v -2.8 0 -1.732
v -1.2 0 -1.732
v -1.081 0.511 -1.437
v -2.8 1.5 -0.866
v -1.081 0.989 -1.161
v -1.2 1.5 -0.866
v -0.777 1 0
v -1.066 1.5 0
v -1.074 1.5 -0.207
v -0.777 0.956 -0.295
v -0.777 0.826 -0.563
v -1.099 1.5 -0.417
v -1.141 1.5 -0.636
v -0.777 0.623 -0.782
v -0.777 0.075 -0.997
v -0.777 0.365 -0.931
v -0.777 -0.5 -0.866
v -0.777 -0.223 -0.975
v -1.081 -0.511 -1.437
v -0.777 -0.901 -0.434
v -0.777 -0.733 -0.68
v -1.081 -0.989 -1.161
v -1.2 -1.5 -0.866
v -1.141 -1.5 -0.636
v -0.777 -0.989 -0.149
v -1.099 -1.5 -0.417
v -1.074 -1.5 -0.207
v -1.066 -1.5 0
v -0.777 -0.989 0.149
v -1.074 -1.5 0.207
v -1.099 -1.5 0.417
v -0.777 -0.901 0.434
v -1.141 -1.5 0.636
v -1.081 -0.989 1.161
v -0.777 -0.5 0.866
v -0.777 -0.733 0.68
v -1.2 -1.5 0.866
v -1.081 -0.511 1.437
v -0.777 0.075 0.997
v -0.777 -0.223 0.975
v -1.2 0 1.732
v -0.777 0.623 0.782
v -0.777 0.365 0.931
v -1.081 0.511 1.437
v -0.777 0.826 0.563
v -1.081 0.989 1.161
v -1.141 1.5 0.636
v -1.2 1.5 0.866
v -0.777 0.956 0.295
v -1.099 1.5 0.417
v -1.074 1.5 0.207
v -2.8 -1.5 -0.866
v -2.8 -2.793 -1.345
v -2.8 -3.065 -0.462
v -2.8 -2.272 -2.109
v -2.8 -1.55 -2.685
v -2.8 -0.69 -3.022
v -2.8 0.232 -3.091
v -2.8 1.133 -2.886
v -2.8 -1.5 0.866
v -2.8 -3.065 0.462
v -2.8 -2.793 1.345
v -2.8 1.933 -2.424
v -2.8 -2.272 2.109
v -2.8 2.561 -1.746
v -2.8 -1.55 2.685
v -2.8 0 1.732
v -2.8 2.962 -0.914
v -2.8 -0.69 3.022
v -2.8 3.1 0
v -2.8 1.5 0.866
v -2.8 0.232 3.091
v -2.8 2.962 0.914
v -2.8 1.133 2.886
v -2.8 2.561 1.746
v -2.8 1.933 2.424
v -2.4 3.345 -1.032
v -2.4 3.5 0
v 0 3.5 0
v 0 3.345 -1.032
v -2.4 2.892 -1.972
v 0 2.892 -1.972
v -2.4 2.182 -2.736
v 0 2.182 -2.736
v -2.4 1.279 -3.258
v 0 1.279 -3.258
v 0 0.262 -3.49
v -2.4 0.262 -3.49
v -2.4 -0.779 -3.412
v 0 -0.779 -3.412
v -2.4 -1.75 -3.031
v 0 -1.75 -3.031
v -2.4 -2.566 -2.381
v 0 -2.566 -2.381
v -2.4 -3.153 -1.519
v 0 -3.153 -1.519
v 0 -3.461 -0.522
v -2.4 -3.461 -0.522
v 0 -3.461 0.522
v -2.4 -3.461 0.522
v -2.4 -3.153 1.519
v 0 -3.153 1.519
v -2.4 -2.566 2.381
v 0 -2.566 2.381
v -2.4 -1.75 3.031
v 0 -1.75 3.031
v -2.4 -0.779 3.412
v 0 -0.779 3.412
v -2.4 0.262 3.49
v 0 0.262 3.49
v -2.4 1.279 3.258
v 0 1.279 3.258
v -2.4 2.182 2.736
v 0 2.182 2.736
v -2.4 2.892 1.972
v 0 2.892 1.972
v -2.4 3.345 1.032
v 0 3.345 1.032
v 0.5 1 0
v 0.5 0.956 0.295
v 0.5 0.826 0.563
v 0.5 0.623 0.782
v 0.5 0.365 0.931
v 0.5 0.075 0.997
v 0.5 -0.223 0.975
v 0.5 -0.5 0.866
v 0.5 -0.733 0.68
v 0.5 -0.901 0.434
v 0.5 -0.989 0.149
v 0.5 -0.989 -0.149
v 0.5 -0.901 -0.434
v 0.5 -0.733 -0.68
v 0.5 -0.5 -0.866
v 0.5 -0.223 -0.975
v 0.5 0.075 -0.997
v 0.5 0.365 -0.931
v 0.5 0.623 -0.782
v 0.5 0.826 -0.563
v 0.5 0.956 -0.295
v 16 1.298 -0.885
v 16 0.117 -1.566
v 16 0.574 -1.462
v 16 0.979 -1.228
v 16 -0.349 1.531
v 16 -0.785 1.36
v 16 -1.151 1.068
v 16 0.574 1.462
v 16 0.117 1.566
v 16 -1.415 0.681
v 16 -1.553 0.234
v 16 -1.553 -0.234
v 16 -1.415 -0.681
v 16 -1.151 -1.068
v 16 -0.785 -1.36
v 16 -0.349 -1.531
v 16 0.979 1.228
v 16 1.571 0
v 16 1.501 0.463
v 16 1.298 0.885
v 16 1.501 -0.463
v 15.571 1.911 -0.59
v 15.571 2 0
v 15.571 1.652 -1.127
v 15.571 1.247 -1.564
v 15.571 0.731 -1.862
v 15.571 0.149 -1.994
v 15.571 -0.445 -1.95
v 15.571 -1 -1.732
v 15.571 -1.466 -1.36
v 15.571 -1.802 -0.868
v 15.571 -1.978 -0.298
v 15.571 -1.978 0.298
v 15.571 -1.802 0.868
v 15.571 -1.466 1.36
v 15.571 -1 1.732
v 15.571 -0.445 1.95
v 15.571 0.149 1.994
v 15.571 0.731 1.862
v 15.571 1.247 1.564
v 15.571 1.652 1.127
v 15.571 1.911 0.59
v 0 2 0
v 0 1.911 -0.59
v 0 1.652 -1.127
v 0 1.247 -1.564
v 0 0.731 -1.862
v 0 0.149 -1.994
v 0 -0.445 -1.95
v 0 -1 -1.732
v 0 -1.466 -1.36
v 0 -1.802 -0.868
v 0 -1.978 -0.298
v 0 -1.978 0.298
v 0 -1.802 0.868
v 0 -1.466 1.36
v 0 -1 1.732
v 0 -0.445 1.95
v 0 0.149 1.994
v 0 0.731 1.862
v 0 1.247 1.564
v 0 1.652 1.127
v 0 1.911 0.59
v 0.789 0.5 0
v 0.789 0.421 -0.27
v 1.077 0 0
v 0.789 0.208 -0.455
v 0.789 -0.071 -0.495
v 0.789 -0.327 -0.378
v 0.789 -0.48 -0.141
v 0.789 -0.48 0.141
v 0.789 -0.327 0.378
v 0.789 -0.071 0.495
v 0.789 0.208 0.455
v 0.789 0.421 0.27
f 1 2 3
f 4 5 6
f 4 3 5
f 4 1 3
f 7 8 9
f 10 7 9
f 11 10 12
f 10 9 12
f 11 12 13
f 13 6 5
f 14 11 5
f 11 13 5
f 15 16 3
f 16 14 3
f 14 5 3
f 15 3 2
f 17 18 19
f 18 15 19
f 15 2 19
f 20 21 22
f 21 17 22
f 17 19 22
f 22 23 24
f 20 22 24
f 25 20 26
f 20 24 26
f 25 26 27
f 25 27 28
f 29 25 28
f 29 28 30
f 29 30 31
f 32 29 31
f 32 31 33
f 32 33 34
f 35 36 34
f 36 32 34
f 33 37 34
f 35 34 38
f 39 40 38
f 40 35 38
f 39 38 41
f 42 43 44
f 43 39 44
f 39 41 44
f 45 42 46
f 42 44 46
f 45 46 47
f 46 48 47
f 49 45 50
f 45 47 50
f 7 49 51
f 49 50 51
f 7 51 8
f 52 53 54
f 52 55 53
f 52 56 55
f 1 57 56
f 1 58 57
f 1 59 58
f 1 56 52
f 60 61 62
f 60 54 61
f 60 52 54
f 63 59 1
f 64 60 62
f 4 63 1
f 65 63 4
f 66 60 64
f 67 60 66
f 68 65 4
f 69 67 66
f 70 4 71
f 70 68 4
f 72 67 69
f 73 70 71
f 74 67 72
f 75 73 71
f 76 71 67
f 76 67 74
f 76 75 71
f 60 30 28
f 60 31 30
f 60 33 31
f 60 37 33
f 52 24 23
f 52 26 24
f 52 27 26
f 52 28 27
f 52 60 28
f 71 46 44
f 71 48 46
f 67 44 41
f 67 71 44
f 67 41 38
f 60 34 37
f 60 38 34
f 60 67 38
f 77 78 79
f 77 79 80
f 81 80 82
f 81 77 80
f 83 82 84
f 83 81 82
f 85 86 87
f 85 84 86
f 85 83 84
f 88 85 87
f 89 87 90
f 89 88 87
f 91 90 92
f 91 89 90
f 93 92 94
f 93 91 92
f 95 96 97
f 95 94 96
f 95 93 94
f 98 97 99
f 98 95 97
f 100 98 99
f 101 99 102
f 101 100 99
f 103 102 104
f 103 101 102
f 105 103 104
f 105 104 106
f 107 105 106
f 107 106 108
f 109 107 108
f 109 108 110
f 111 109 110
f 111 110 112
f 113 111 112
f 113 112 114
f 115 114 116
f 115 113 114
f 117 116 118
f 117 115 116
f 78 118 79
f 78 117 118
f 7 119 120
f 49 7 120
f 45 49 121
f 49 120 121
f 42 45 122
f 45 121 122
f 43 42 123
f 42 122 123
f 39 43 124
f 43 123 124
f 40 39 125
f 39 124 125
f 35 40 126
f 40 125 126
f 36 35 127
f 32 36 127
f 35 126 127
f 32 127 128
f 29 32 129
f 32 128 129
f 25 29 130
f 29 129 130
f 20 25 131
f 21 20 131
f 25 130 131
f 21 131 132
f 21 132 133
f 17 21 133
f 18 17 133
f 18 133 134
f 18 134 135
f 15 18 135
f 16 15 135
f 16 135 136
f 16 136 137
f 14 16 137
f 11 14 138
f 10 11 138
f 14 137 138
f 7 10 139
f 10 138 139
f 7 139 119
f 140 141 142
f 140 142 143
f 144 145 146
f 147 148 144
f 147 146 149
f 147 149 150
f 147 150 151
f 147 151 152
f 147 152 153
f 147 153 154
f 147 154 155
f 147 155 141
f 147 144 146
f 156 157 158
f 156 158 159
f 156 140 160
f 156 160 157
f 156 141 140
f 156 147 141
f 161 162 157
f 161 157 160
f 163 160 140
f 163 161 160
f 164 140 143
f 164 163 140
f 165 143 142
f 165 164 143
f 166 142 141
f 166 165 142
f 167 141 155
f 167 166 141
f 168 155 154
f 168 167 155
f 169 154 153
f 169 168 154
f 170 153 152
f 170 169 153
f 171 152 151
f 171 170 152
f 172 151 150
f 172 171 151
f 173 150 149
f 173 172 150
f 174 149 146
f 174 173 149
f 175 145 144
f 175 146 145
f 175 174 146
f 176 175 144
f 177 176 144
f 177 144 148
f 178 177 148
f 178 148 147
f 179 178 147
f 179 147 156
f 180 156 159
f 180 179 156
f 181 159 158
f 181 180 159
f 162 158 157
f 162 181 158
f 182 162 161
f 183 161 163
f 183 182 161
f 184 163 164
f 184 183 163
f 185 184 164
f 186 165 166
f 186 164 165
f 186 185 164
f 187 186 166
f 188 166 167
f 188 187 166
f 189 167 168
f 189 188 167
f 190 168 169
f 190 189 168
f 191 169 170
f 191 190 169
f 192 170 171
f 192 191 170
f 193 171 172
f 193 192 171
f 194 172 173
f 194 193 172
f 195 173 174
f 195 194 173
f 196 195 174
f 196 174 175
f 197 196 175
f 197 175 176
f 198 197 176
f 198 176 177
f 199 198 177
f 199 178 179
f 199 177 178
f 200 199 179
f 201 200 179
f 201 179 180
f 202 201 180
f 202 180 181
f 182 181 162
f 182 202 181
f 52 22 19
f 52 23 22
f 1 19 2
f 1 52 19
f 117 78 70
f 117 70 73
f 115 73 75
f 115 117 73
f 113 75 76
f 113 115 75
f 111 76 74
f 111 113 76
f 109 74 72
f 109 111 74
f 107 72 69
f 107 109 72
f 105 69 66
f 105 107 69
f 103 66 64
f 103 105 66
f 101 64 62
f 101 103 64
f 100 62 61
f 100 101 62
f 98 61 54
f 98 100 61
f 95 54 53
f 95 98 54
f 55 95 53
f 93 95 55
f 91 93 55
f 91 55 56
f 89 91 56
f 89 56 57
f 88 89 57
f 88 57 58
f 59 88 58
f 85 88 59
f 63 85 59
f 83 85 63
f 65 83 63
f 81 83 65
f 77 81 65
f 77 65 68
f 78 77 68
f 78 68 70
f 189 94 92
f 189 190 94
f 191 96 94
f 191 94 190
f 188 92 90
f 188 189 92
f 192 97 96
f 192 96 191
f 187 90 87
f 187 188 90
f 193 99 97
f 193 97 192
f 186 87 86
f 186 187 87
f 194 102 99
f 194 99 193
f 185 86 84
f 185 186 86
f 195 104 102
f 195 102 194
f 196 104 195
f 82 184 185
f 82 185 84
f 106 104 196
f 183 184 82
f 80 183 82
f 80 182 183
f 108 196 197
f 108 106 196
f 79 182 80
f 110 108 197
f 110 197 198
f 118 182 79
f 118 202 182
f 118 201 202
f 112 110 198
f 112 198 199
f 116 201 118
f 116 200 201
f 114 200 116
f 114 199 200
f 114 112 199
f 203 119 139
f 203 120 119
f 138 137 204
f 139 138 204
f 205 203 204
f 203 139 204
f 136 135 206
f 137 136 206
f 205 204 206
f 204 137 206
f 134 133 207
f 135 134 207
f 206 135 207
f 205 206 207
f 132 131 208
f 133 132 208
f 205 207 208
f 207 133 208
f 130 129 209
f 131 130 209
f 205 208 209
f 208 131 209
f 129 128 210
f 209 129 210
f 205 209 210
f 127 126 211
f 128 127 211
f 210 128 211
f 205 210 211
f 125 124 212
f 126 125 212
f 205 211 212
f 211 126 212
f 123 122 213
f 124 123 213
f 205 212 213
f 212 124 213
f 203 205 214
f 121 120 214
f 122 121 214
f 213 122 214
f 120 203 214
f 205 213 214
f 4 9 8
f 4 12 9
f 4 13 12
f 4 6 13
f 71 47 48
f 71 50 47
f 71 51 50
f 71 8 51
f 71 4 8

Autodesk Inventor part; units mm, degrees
ref_plane "YZ Plane" through (0, 0, 0) normal (1, 0, 0) x (0, 1, 0)
ref_plane "XZ Plane" through (0, 0, 0) normal (0, 1, 0) x (-1, 0, 0)
sketch "Эскиз1" plane through (0, 0, 0) normal (0, 0, 1) x (1, 0, 0)
  line L0 (1.0774, 0) -> (16, 0)
  line L1 (16, 0) -> (16, 2)
  line L2 (16, 2) -> (0, 2)
  line L3 (0, 2) -> (0, 3.5)
  line L4 (0, 3.5) -> (-2.8, 3.5)
  line L5 (-2.8, 3.5) -> (-2.8, 1.7321)
  line L6 (-2.8, 1.7321) -> (-1.2, 1.7321)
  line L7 (-1.2, 1.7321) -> (-0.7774, 1)
  line L8 (-6.56, 0) -> (19.76, 0) projected
  line L9 (0, -0.7) -> (0, 4.2) projected
  line L10 (-0.7774, 1) -> (0.5, 1)
  line L11 (0.5, 1) -> (1.0774, 0)
  line L12 (-2.8, 1.7321) -> (-2.8, 0) construction
  line L13 (-2.8, 3.1) -> (-2.4, 3.5)
  dimension "d0" = 2.8
  dimension "d1" = 1.6
  dimension "d2" = 60
  dimension "d3" = 4
  dimension "d4" = 3.4641
  dimension "d5" = 7
  dimension "d15" = 3.3
  dimension "d16" = 2
  dimension "d17" = 16
  dimension "d32" = 45
  dimension "d33" = 0.4
revolve "Базовый элемент" add sketch "Эскиз1" angle 360 about axis through (1.0774, 0, 0) along (1, 0, 0) contours L11 L10 L9 L2 L1 L0 | L10 L7 L6 L5 L13 L4 L3 L9 | L13 L5 L4
revolve "Фаска2" cut sketch "Эскиз1" angle 360 about axis through (-10, 0, 0) along (1, 0, 0) contours L13 L5 L4
sketch "Эскиз2" plane through (-2.8, 0, 0) normal (-1, 0, 0) x (0, 0, 1)
  circle A0 centre (0, 0) radius 1.7321 projected
  line L0 (0, -4.9) -> (0, 4.9) projected
  line L1 (-4.9, 0) -> (4.9, 0) projected
  line L2 (1.7321, 0) -> (0.866, -1.5)
  line L3 (0.866, -1.5) -> (-0.866, -1.5)
  line L4 (-0.866, -1.5) -> (-1.7321, 0)
  line L5 (-1.7321, 0) -> (-0.866, 1.5)
  line L6 (-0.866, 1.5) -> (0.866, 1.5)
  line L7 (0.866, 1.5) -> (1.7321, 0)
extrude "Паз" add sketch "Эскиз2" against normal up to next contours L7 A0 | A0 L2 | L6 L0 A0 | A0 L0 L3 | L0 L6 A0 | A0 L3 L0 | L4 A0 | A0 L5
thread "Резьба" size "M4x0.7" class "6g" standard "ISO Metric profile" length 12.5
chamfer "Фаска1" distance 0.4294 distance2 0.4294 1 edges at (16, -2, 0) measured on face at (16, 0.527, -0.2661)
ref_plane "Work Plane1" through (8, 0, 0) normal (0, 0.5, 0.866) x (1, 0, 0)
equation "\"d0\" = KOH"
equation "\"d1\" = INTI"
equation "\"d3\" = GD"
equation "\"d4\" = 1.1547 * SW"
equation "\"d5\" = KOD"
equation "\"d15\" = INFT"
equation "\"d16\" = SDT"
equation "\"d17\" = NLG"
equation "\"d33\" = Cham"
equation "\"d7\" = GEL"
equation "\"d9\" = -0.5 * SPD + 0.5 * GD"
equation "\"d12\" = GUL"
equation "\"GD\" = NND"
equation "\"NLG\" = 16"
equation "\"GEL\" = 12.5"
equation "\"KOD\" = 7"
equation "\"KOH\" = 2.8"
equation "\"GUL\" = 0.61345 * PTC"
equation "\"SW\" = 3"
equation "\"INTI\" = 1.6"
equation "\"SPD\" = NND - 1.2269 * PTC"
equation "\"SDT\" = 2"
equation "\"INFT\" = 3.3"
equation "\"Cham\" = 0.4"
equation "\"TOA\" = 30deg"
equation "\"GD1\" = THREADDIA - 1.2269 * PTC"
equation "\"THREADDIA\" = 4"
equation "\"BDM\" = NND"
equation "\"FAWI\" = 45deg"
equation "\"RR\" = 0.1 * NND"
equation "\"PTC\" = 0.7"
equation "\"NND\" = 4"
equation "\"FAWI1\" = 45deg"
equation "\"GAL\" = 0.61345 * PTC"
equation "\"E0\" = 1.155 * SW"
properties part number "DIN 6912 - M4 x 16" material "Сталь, мягкая"
